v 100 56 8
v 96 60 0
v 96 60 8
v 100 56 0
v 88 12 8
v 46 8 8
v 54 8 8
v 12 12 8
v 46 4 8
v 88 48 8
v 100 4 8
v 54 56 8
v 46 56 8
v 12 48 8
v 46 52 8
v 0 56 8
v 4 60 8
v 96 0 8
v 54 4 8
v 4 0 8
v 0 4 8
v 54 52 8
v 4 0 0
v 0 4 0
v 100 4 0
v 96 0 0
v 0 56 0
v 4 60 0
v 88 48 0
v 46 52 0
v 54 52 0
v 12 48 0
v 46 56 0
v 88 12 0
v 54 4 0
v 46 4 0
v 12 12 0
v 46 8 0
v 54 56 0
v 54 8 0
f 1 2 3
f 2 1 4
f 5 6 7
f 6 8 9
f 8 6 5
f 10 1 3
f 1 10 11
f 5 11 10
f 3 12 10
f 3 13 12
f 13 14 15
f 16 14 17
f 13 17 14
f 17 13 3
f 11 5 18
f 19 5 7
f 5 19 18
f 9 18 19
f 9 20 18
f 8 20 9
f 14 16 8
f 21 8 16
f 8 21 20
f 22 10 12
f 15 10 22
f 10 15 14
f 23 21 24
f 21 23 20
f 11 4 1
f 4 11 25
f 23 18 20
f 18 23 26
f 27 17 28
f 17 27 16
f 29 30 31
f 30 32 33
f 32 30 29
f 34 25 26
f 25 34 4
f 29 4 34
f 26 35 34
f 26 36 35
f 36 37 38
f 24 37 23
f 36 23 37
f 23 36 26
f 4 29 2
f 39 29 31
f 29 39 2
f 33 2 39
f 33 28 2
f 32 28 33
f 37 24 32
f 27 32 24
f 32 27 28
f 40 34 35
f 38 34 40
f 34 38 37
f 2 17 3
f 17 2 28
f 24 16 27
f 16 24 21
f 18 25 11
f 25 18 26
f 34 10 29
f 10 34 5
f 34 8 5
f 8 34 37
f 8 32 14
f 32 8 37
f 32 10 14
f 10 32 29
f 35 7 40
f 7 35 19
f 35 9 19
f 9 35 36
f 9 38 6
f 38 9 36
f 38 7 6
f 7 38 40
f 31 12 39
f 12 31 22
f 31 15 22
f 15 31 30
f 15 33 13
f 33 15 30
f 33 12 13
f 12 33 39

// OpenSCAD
$fn = 32;

// ----------------------------------------------------------------------
// Frame plate: 100 x 60 frame, 12 mm rails
// ----------------------------------------------------------------------

// --- parameters (mm) ---
plate_l = 100;            // plate length, X
plate_w = 60;             // plate width, Y
plate_t = 8;              // plate thickness, Z (extrusion height)
corner_c = 4;             // corner chamfer
frame_bar = 12;           // frame rail width
slot_l = 8;               // adjustment slot length
slot_w = 4;               // adjustment slot width

win_l = plate_l - 2 * frame_bar;  // window length
win_w = plate_w - 2 * frame_bar;  // window width

profile = [[4, 0], [96, 0], [100, 4], [100, 56], [96, 60], [4, 60], [0, 56], [0, 4]];  // primary outline, 8 points, counter clockwise
void_1 = [[12, 12], [88, 12], [88, 48], [12, 48]];  // the window, 4 points
void_2 = [[46, 4], [54, 4], [54, 8], [46, 8]];  // adjustment slot, 4 points
void_3 = [[46, 52], [54, 52], [54, 56], [46, 56]];  // adjustment slot, 4 points

// --- the one profile operation ---
difference() {
  linear_extrude(height = plate_t) polygon(points = profile);
  translate([0, 0, -1])
    linear_extrude(height = plate_t + 2) polygon(points = void_1);
  translate([0, 0, -1])
    linear_extrude(height = plate_t + 2) polygon(points = void_2);
  translate([0, 0, -1])
    linear_extrude(height = plate_t + 2) polygon(points = void_3);
}
